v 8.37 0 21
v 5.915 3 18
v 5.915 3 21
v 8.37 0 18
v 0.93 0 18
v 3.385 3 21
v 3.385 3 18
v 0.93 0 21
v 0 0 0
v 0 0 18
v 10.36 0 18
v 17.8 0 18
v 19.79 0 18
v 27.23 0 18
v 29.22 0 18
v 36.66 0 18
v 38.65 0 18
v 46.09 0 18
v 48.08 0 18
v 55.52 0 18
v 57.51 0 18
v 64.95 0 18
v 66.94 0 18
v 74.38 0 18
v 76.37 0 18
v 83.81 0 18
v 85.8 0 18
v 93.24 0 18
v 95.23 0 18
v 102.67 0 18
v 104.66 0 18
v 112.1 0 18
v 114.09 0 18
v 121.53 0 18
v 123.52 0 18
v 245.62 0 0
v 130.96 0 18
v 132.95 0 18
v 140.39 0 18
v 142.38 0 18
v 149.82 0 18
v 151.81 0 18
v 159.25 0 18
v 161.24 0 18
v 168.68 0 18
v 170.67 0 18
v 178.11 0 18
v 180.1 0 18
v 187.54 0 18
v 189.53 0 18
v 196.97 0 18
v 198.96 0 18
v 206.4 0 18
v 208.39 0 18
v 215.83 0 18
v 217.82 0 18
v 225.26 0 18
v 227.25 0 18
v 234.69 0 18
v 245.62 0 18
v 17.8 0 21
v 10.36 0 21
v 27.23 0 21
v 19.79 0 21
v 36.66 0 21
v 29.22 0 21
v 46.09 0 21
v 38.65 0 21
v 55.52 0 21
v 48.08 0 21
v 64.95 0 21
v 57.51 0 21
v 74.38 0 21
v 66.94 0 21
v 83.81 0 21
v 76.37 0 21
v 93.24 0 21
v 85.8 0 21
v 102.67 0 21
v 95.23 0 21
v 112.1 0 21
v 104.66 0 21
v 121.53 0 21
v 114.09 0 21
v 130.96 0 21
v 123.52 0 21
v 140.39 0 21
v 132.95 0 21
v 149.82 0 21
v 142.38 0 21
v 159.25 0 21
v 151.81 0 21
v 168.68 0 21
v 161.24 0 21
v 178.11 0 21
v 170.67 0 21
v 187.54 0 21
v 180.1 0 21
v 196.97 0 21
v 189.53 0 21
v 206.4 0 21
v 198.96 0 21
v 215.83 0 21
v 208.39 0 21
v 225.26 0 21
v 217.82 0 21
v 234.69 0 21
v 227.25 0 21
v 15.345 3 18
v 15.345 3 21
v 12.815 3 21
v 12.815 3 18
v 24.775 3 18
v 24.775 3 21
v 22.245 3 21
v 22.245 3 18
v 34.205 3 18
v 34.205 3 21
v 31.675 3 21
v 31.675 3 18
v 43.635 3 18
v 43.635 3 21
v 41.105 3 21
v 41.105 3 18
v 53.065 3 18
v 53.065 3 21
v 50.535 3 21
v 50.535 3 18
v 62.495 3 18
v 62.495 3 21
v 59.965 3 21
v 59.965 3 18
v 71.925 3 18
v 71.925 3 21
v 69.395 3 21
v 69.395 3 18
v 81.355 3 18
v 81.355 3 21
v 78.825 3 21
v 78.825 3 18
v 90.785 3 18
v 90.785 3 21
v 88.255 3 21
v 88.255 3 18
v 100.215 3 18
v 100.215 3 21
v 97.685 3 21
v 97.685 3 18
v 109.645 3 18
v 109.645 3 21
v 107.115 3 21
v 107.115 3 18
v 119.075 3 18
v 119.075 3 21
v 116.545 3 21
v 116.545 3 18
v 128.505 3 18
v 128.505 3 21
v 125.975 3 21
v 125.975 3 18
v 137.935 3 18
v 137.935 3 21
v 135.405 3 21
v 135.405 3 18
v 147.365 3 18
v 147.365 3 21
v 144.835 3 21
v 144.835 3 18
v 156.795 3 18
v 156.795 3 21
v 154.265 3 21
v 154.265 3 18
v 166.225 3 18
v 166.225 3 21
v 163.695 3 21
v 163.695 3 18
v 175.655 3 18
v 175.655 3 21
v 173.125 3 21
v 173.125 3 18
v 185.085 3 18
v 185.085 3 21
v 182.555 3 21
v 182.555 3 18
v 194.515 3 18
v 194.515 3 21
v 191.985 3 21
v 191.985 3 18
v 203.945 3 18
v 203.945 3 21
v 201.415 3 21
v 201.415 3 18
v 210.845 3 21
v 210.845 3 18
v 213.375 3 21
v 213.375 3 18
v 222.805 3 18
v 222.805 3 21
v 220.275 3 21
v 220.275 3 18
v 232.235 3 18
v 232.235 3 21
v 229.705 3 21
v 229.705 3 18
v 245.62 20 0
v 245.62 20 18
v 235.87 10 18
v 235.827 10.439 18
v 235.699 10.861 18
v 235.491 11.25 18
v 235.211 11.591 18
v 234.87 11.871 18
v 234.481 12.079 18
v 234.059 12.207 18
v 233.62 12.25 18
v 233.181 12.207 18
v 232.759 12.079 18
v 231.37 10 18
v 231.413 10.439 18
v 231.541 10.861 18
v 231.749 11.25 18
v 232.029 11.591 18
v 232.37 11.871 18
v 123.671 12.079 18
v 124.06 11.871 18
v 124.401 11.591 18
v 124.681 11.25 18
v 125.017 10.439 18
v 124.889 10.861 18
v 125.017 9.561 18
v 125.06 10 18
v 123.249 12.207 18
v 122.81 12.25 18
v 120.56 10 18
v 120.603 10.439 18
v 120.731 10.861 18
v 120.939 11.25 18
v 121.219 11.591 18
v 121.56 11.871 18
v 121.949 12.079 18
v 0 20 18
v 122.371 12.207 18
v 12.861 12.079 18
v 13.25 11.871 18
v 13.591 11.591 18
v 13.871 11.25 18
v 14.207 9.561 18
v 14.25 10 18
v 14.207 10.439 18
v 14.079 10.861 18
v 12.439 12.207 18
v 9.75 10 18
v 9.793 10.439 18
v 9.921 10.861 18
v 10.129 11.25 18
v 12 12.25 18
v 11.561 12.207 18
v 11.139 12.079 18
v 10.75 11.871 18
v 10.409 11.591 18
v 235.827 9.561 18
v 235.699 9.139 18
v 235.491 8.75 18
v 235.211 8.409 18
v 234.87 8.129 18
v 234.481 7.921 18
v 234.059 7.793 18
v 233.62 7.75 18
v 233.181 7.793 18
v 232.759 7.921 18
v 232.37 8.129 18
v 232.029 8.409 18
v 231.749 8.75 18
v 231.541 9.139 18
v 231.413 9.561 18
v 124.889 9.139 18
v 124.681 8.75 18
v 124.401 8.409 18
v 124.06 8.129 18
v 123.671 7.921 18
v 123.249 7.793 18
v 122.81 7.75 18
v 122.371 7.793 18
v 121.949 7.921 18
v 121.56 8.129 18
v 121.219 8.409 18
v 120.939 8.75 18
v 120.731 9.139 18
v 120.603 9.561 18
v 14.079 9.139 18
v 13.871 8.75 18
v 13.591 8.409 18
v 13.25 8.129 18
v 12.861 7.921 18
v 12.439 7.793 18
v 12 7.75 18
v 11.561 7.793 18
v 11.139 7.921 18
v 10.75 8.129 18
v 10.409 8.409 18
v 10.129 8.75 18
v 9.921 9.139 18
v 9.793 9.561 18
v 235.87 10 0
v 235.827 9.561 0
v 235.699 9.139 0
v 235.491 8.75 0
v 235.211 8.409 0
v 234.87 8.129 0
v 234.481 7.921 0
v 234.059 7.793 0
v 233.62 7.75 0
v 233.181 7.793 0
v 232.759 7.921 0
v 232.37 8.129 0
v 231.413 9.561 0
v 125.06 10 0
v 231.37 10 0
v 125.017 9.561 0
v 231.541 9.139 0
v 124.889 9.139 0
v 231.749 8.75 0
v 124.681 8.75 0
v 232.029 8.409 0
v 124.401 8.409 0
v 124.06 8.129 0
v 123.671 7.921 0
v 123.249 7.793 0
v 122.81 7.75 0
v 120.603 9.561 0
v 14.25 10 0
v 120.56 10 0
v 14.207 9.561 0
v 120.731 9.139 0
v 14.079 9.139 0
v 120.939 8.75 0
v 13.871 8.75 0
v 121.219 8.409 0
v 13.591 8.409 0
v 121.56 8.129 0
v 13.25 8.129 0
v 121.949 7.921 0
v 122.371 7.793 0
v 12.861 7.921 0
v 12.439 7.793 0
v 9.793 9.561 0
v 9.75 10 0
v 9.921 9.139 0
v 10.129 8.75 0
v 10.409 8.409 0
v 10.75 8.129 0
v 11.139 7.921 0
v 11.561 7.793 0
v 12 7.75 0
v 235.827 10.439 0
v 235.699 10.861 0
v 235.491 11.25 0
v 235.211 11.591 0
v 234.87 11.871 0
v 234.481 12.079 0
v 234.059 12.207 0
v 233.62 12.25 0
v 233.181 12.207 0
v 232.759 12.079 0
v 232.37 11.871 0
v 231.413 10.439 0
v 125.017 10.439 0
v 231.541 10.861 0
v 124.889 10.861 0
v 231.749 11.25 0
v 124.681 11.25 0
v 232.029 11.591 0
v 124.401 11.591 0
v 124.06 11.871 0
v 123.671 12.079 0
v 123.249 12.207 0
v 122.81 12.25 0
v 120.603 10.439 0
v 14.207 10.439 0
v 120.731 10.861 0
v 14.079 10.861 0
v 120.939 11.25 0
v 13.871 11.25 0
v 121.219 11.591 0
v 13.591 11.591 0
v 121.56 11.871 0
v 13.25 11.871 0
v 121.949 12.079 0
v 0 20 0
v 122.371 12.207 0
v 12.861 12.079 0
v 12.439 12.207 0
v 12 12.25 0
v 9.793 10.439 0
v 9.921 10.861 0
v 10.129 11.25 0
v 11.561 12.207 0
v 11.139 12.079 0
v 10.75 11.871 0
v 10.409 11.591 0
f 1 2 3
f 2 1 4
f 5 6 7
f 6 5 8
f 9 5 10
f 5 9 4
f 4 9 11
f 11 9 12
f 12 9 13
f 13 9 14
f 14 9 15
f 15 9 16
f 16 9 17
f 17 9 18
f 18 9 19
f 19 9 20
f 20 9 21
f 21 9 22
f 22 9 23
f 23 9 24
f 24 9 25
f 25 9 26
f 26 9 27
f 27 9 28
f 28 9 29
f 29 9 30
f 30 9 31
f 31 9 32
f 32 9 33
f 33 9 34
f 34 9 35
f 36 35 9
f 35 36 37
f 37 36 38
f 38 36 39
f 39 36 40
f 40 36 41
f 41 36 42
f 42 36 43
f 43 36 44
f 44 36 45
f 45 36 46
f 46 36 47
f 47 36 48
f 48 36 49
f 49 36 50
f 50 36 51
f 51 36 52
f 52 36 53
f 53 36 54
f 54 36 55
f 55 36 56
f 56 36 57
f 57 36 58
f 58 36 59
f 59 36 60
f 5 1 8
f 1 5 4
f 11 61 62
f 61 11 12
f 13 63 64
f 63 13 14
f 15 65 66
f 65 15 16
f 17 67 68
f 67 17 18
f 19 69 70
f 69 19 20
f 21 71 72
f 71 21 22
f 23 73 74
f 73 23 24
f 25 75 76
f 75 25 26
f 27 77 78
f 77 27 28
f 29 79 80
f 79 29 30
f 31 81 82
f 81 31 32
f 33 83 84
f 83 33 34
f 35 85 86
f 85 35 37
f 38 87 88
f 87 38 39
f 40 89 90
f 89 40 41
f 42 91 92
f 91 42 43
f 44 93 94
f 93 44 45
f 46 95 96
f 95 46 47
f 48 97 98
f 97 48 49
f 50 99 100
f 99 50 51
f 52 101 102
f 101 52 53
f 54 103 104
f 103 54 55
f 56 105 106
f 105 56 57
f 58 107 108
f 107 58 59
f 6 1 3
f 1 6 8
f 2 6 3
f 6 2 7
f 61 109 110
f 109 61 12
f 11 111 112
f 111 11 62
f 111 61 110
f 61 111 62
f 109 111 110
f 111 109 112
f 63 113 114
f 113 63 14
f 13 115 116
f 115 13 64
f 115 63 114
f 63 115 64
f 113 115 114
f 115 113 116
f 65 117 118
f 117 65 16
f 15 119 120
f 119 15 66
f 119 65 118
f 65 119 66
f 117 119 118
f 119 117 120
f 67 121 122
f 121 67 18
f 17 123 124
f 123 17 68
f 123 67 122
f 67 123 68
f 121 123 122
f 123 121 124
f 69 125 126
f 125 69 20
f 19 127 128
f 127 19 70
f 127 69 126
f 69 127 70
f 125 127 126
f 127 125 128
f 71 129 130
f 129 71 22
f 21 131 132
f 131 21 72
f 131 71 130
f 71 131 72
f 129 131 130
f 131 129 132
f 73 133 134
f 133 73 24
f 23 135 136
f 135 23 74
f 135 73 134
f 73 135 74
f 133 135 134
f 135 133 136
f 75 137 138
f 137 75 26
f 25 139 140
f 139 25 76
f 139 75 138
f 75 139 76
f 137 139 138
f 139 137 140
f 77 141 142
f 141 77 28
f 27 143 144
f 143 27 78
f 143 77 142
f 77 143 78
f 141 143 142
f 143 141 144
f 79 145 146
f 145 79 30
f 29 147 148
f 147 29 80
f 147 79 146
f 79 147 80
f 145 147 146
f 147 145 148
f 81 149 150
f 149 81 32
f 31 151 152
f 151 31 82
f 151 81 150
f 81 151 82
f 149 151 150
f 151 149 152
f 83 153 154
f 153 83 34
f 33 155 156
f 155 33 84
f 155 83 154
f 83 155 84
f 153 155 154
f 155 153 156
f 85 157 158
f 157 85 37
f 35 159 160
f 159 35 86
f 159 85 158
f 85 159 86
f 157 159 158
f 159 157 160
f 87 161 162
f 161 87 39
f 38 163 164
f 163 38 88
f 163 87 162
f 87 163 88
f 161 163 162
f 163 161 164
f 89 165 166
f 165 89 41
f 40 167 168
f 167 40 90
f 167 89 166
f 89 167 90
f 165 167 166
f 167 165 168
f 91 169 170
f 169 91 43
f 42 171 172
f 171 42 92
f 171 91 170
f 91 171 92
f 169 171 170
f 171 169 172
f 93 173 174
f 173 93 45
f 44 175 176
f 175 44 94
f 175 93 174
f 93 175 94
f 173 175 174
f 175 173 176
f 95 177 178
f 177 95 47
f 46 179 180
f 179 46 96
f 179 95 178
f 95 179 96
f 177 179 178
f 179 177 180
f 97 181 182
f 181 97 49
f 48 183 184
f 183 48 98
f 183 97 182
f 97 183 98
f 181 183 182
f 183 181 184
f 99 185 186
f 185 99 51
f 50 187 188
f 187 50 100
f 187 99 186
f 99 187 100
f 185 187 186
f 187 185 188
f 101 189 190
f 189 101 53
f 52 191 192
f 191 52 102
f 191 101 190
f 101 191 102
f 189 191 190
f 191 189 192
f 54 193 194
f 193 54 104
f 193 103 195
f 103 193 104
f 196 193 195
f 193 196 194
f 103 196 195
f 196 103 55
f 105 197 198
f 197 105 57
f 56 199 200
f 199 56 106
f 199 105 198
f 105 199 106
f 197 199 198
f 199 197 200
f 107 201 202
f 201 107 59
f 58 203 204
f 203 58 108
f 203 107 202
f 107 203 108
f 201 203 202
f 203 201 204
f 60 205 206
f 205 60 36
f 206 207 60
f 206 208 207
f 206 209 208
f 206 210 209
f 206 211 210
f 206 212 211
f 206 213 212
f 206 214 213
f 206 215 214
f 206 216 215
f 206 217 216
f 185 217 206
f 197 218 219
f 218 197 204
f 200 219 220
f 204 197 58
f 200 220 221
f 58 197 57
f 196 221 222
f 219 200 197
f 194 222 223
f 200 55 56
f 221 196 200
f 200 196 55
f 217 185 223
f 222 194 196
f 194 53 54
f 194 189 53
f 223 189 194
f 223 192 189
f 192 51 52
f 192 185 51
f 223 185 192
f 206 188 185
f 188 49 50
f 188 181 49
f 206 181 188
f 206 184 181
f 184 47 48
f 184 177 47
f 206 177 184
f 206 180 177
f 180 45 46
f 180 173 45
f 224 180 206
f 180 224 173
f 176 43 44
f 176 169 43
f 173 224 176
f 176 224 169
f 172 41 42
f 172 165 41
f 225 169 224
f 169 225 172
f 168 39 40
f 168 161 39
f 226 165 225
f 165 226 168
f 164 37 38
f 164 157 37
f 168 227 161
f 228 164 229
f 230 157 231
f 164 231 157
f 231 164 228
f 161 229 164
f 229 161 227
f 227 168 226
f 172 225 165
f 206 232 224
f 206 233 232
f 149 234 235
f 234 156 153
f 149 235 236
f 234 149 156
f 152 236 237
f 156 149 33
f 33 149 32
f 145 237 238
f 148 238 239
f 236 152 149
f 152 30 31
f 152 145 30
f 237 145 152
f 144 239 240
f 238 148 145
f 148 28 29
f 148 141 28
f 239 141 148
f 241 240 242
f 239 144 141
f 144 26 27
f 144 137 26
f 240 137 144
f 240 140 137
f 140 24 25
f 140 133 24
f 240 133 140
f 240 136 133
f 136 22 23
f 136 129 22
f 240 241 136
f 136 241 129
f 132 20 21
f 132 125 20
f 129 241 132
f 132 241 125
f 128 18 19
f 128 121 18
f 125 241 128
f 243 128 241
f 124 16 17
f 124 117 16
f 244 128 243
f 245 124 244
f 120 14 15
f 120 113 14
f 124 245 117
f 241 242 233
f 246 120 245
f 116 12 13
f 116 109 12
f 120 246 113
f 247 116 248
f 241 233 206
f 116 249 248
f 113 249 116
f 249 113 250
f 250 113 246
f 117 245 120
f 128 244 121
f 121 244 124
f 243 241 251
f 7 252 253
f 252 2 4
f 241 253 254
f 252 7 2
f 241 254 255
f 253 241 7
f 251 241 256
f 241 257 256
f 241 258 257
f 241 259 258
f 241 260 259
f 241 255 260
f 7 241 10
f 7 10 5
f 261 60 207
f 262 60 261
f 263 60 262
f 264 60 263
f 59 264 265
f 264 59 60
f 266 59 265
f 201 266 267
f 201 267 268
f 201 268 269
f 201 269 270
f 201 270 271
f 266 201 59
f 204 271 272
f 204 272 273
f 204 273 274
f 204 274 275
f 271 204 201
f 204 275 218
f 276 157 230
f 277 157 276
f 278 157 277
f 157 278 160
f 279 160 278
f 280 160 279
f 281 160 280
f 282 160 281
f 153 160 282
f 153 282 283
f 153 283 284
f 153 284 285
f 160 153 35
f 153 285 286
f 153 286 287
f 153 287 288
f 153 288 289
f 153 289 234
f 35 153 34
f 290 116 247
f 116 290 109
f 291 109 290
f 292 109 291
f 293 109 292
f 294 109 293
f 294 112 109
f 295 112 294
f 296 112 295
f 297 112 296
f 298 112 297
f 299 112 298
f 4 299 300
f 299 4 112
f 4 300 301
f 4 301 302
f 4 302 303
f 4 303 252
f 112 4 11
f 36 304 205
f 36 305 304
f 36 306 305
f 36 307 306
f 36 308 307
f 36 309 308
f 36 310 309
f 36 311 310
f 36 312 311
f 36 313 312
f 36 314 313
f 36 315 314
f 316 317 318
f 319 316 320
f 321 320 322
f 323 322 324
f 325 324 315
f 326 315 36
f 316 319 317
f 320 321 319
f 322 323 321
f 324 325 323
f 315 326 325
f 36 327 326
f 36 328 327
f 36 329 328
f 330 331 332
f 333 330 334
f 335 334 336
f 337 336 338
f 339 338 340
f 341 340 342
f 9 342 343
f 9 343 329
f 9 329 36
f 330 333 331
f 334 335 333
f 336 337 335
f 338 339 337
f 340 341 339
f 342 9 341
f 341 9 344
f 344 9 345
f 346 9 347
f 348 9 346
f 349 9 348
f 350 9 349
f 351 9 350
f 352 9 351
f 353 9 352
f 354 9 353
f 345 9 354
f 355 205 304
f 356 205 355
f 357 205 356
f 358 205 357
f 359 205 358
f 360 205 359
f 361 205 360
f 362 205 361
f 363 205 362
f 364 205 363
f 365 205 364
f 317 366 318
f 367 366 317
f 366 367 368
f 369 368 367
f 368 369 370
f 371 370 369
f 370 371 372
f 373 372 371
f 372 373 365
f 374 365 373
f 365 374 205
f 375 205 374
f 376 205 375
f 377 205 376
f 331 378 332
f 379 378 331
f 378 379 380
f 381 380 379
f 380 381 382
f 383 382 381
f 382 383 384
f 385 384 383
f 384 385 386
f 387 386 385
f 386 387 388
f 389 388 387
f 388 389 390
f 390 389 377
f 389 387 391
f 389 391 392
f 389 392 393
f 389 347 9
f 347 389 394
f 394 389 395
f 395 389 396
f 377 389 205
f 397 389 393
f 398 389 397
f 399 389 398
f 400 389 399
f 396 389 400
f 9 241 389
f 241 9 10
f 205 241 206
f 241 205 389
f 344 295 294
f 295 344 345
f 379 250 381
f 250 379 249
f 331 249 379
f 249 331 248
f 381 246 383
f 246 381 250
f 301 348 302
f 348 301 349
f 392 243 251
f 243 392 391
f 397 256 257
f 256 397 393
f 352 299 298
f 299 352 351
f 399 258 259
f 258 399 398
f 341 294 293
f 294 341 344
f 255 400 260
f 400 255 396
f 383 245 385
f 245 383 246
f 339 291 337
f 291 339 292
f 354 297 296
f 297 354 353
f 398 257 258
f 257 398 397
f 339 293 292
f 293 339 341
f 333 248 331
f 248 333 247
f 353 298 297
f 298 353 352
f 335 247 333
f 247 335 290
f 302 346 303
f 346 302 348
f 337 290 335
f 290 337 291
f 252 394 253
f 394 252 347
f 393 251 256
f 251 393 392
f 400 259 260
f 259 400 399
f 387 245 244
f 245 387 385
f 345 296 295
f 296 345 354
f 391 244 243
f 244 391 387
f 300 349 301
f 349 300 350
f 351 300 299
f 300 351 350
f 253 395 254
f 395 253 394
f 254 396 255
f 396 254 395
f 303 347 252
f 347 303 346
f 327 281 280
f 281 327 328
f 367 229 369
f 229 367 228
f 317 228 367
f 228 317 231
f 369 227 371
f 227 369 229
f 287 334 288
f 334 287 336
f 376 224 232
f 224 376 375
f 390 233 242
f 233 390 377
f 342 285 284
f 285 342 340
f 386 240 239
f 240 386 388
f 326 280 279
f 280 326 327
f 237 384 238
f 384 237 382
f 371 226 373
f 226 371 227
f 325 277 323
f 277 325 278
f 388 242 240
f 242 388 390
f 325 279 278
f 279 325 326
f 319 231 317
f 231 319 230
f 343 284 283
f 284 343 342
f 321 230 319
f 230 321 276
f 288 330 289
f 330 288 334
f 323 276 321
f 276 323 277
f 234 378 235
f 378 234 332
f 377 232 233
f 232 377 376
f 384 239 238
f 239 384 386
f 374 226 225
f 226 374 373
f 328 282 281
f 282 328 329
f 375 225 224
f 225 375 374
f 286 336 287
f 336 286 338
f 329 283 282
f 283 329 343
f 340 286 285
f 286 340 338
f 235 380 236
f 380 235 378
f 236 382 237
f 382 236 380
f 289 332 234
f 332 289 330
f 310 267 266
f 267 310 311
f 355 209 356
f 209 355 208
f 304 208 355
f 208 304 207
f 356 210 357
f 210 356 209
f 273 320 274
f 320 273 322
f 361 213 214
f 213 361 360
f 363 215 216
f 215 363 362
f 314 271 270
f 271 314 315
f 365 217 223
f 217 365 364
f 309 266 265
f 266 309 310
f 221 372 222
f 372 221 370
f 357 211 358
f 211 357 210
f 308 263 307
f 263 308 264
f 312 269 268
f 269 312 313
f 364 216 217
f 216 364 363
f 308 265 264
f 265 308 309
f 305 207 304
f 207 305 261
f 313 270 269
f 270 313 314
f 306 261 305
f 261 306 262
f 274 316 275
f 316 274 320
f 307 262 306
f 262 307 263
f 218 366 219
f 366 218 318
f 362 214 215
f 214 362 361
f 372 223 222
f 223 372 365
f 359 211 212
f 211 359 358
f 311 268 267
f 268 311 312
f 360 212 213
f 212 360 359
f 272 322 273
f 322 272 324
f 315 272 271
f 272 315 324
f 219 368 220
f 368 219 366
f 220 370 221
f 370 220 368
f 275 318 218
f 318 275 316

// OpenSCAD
$fn = 32;

// ----------------------------------------------------------------------
// Gear rack: m=3 z=25, 245.62 x 20 x 21 mm
// ----------------------------------------------------------------------

// --- parameters (mm) ---
length = 245.62;          // rack length, X
width = 20;               // rack width, Y
height = 21;              // overall height, Z
module_m = 3;             // module
back_t = 18;              // tooth root line height
pitch = 9.43;             // circular pitch
tip_w = 2.53;             // tooth thickness at the tip
root_w = 7.44;            // tooth thickness at the root line
hole_d = 4.5;             // mounting hole
sink = 0.6;               // tooth root overlap into the body

tooth_span = 235.62;

module tooth(x0) {
  /* 20 deg flank profile, sunk into the body for a positive overlap */
  translate([x0, 0, back_t - sink])
    linear_extrude(height = height - back_t + sink)
      polygon(points = [[-root_w / 2, 0], [root_w / 2, 0],
                        [tip_w / 2, height - back_t],
                        [-tip_w / 2, height - back_t]]);
}

difference() {
  union() {
    cube([length, width, back_t]);
    for (i = [0 : 25 - 1])
      tooth((i + 0.5) * pitch + (tooth_span - 25 * pitch) / 2);
  }
  translate([12, 10, -1]) cylinder(h = back_t + 2, d = hole_d);
  translate([122.81, 10, -1]) cylinder(h = back_t + 2, d = hole_d);
  translate([233.62, 10, -1]) cylinder(h = back_t + 2, d = hole_d);
}
